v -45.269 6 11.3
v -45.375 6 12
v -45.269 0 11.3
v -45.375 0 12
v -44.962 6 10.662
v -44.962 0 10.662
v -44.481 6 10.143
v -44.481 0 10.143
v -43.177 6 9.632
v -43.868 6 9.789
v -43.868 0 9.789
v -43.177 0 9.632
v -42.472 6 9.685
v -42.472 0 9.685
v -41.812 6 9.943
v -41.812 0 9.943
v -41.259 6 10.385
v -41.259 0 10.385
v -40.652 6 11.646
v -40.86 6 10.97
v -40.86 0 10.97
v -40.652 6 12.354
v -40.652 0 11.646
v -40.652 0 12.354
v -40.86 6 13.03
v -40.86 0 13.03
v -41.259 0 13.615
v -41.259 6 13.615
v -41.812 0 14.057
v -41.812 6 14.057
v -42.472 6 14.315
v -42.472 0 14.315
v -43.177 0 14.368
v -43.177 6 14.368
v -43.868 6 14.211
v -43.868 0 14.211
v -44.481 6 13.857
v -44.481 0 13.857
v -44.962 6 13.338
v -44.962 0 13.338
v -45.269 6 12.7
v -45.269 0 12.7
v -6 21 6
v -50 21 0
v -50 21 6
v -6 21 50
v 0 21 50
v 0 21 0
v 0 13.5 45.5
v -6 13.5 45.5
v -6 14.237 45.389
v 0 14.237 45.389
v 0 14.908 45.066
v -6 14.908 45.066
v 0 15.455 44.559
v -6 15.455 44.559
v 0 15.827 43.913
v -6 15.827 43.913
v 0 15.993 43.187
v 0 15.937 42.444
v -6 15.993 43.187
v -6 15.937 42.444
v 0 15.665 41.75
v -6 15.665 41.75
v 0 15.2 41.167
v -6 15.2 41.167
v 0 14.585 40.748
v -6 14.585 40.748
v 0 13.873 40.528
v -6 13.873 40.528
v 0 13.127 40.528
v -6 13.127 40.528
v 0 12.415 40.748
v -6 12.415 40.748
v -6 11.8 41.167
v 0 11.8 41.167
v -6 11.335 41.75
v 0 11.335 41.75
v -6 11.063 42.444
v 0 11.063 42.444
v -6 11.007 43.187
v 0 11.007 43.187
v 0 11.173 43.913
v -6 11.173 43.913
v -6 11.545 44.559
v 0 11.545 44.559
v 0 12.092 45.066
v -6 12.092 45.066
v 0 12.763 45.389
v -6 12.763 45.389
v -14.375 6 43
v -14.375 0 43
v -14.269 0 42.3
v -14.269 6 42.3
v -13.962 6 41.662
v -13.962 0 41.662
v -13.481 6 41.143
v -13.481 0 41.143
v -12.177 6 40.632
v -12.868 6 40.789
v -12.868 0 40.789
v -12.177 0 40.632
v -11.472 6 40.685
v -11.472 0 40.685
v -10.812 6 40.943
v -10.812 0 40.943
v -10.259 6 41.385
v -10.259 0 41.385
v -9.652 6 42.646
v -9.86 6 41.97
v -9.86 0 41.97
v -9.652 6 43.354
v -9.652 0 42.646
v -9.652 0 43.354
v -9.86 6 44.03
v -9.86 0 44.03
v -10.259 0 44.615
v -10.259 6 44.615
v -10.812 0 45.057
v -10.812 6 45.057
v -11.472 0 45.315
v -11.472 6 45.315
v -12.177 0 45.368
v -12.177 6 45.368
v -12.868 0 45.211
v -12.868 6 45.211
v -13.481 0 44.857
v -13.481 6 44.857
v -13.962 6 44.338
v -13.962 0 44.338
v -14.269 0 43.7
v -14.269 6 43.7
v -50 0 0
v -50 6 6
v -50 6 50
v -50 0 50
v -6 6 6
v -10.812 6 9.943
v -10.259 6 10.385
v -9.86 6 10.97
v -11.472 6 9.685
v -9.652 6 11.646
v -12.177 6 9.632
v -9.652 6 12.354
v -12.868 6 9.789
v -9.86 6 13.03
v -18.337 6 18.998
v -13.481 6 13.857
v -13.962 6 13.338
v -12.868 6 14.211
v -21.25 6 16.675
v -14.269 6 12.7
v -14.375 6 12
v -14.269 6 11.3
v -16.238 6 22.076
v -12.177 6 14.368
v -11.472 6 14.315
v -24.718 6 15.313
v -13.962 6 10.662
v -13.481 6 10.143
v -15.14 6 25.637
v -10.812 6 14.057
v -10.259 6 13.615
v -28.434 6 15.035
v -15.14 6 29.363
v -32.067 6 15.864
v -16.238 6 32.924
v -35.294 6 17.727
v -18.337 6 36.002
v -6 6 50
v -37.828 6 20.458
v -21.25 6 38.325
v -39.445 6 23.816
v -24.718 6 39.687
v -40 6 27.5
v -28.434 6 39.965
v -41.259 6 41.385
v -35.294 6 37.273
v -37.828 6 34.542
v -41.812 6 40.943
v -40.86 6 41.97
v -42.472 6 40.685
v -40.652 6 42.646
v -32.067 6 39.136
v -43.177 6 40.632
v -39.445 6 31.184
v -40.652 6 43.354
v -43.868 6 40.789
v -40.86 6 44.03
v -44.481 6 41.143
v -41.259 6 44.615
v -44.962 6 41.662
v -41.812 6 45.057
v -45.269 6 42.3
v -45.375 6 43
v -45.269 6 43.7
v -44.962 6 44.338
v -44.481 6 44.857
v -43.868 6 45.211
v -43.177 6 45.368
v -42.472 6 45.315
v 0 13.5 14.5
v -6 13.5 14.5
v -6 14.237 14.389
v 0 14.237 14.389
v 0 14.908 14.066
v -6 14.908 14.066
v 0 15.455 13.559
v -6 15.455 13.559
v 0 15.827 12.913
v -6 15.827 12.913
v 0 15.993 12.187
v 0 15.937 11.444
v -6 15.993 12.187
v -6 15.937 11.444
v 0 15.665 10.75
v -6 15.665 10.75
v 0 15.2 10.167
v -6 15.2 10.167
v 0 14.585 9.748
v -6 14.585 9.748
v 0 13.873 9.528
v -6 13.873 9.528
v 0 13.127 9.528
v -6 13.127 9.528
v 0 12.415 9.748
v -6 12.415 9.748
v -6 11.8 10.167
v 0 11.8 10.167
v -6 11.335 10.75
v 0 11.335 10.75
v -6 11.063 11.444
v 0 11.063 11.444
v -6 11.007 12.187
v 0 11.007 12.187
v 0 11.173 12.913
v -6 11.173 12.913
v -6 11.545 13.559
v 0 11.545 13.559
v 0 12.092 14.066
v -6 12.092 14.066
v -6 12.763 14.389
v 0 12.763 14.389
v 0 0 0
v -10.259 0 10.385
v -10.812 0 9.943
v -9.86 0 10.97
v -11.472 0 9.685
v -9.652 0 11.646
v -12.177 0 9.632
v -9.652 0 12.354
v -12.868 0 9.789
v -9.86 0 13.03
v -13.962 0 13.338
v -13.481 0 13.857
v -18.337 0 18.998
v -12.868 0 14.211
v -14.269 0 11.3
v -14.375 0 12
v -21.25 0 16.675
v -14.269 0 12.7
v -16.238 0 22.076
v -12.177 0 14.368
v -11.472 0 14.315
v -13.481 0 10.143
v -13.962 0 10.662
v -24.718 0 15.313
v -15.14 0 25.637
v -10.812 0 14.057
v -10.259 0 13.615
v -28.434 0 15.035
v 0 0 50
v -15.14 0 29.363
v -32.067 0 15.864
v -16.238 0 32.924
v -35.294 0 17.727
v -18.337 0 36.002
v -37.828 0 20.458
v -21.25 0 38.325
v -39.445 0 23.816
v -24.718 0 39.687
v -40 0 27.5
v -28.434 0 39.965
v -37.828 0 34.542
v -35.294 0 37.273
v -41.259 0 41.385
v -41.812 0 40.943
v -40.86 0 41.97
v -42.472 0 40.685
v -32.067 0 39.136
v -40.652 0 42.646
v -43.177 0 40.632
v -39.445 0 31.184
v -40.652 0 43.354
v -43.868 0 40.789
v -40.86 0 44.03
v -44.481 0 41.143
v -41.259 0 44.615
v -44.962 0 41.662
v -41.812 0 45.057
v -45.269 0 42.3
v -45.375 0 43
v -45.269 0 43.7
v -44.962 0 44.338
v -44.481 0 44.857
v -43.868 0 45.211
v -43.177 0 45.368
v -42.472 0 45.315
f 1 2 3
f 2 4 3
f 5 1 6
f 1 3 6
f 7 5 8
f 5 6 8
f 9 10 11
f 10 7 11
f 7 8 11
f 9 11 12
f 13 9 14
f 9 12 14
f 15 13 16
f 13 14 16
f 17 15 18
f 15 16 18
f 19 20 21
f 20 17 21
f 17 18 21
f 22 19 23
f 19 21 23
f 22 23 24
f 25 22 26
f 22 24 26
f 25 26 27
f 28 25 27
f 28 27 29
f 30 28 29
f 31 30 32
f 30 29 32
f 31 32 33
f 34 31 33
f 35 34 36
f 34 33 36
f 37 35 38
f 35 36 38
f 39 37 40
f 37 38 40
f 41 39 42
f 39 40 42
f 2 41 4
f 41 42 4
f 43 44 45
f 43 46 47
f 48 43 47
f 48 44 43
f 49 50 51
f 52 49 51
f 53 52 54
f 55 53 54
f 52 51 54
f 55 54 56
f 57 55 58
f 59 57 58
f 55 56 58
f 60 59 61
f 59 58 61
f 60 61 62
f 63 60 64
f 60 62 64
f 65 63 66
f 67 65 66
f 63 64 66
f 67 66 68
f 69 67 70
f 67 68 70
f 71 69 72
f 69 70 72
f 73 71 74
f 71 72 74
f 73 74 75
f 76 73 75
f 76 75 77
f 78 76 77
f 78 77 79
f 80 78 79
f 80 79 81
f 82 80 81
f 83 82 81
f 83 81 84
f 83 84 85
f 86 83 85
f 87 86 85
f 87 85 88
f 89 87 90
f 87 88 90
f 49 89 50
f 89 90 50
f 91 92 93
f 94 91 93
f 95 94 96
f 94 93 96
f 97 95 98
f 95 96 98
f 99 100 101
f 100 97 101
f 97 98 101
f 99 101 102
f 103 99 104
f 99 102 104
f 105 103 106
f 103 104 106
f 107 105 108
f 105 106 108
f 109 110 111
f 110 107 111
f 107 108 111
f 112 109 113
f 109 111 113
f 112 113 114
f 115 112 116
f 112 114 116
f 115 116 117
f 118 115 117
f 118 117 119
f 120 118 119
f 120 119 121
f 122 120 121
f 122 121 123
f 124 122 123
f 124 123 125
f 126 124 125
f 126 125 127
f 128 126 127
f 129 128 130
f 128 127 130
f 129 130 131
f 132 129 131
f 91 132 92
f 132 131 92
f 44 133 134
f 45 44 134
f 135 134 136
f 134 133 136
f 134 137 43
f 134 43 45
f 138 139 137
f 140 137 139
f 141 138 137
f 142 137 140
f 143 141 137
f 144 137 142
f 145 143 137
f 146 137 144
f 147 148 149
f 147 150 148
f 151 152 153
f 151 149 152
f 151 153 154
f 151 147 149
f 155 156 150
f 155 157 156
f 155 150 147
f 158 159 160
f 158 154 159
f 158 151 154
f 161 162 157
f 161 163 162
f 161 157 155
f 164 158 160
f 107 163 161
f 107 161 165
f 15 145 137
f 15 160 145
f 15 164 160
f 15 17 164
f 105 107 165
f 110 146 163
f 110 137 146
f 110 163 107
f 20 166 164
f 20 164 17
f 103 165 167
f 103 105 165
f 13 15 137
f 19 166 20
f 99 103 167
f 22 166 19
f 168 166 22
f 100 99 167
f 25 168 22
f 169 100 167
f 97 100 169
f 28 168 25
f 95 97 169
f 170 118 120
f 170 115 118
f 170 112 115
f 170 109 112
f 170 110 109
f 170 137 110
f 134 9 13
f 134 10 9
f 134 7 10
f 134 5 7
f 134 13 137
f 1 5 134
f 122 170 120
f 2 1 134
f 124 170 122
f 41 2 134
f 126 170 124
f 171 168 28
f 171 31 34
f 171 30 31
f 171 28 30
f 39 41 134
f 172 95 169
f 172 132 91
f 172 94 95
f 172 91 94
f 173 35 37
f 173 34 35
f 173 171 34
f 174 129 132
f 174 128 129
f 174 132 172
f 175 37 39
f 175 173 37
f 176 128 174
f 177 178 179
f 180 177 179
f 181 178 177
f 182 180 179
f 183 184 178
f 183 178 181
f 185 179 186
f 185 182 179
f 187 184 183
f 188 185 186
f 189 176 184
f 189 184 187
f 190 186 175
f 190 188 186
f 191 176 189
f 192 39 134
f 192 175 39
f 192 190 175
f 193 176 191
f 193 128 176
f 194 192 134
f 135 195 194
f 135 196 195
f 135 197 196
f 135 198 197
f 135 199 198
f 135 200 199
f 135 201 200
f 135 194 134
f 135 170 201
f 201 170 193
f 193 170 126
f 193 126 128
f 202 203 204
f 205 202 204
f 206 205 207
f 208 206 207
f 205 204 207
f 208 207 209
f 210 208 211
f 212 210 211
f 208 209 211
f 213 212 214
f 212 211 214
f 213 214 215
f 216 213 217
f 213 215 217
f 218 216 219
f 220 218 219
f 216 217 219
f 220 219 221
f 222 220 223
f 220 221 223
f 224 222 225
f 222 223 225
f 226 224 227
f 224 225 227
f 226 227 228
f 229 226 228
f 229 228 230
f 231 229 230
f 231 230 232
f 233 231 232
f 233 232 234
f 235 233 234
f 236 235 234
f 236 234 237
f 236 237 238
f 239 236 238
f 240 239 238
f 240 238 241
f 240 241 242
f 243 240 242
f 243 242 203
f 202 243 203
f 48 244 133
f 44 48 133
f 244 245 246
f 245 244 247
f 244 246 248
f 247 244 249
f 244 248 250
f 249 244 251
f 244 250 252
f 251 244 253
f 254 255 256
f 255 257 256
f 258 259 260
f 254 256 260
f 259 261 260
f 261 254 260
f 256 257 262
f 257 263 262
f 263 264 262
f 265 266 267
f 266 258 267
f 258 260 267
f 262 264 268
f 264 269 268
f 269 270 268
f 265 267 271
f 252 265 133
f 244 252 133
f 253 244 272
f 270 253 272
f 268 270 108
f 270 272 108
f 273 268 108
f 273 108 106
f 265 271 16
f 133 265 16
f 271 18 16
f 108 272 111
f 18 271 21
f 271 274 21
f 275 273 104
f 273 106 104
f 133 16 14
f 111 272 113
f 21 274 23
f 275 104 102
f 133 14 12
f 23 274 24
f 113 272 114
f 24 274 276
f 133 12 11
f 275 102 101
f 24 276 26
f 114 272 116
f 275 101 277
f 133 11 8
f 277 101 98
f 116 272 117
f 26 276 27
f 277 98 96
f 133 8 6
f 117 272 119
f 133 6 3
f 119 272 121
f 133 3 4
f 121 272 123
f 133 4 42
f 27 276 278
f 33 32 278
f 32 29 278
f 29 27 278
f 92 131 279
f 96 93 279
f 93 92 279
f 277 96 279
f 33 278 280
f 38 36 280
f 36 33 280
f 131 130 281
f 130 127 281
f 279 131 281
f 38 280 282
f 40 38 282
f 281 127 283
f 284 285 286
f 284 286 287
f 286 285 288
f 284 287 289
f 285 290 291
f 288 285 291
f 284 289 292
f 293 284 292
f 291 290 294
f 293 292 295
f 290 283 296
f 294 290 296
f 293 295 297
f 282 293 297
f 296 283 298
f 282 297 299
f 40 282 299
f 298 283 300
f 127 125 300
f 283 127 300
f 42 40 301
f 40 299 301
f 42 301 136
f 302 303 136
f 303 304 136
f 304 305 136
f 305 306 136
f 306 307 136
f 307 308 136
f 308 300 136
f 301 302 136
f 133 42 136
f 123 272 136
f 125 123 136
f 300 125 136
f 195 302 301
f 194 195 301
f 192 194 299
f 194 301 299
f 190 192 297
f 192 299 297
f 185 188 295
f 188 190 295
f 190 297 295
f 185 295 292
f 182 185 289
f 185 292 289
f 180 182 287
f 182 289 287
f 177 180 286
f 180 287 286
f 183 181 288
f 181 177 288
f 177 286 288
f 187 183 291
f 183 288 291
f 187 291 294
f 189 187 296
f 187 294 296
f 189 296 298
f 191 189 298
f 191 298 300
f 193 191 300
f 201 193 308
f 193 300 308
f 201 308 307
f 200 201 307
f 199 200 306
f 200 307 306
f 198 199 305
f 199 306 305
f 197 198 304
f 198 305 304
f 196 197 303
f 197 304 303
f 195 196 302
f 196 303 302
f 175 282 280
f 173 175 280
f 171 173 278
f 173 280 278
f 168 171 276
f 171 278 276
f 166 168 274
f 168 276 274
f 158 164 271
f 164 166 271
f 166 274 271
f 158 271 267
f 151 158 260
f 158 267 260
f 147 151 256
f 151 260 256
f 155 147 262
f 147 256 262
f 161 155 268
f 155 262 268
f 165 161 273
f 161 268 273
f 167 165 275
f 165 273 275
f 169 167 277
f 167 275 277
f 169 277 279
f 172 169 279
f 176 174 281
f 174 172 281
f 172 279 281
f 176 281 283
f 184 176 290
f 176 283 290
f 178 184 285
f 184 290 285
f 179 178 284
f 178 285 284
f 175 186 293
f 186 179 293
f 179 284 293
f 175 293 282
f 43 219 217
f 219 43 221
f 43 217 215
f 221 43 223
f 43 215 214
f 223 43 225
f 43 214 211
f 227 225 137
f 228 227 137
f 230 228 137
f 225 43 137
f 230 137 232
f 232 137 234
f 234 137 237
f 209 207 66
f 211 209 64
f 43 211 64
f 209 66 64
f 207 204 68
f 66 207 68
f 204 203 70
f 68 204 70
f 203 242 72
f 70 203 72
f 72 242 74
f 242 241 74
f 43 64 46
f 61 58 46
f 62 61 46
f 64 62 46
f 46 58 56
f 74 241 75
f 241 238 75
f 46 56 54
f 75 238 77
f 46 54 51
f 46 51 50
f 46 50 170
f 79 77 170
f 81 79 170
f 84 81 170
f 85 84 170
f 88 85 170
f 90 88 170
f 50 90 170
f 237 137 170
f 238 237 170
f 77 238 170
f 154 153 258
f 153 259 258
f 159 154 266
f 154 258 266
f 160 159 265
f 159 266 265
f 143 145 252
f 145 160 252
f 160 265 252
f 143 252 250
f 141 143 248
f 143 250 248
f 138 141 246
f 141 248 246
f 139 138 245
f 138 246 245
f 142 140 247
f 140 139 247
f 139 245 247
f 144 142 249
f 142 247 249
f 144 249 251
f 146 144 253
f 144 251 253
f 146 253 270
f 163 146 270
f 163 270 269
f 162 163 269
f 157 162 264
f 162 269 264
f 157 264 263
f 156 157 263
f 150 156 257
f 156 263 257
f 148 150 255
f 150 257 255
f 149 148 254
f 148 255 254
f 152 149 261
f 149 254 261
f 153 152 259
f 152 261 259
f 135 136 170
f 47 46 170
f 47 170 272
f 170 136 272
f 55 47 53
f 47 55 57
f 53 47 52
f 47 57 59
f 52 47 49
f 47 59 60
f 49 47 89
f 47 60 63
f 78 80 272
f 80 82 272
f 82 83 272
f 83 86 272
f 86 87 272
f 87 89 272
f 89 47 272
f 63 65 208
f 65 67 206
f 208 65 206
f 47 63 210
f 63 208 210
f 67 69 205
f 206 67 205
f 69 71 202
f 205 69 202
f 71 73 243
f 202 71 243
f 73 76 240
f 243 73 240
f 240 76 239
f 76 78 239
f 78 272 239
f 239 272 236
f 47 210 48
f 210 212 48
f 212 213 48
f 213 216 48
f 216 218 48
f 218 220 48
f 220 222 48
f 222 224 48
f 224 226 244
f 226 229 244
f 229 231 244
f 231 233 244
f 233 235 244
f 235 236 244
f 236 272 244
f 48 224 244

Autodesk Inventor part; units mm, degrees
ref_plane "YZ Plane" through (0, 0, 0) normal (1, 0, 0) x (0, 1, 0)
ref_plane "XZ Plane" through (0, 0, 0) normal (0, 1, 0) x (-1, 0, 0)
ref_plane "XY Plane" through (0, 0, 0) normal (0, 0, 1) x (1, 0, 0)
sketch "Sketch1" plane through (0, 0, 0) normal (0, 1, 0) x (-1, 0, 0)
  line L0 (0, 0) -> (50, 0)
  line L1 (50, 0) -> (50, 50)
  line L2 (50, 50) -> (0, 50)
  line L3 (0, 50) -> (0, 0)
  circle A0 centre (12, 43) radius 2.375
  circle A1 centre (43, 43) radius 2.375
  circle A2 centre (43, 12) radius 2.375
  circle A3 centre (12, 12) radius 2.375
  circle A4 centre (27.5, 27.5) radius 12.5
  line L4 (43, 12) -> (27.5, 27.5) construction
  line L5 (27.5, 27.5) -> (12, 43) construction
  dimension "d0" = 50
  dimension "d1" = 50
  dimension "d2" = 4.75
  dimension "d3" = 31
  dimension "d4" = 31
  dimension "d5" = 7
  dimension "d6" = 7
  dimension "d7" = 25
extrude "Extrusion1" add sketch "Sketch1" along normal blind 6
sketch "Sketch2" plane through (0, 6, 0) normal (0, 1, 0) x (1, 0, 0)
  line L0 (0, 0) -> (-50, 0) projected
  line L1 (0, -50) -> (0, 0) projected
  line L2 (-50, 0) -> (0, 0)
  line L3 (0, -50) -> (-6, -50)
  line L4 (-6, -6) -> (-50, -6)
  line L5 (-6, -6) -> (-6, -50)
  line L6 (-50, -6) -> (-50, 0)
  line L7 (0, -50) -> (-6, -50)
  line L8 (0, 0) -> (0, -50)
  dimension "d10" = 6
extrude "Extrusion2" add sketch "Sketch2" along normal blind 15
sketch "Sketch3" plane through (-6, 6, 6) normal (-1, 0, 0) x (0, 0, 1)
  line L0 (0, 0) -> (0, 15) projected
  circle A0 centre (6, 7.5) radius 2.5
  circle A1 centre (37, 7.5) radius 2.5
  line L1 (0, 7.5) -> (6, 7.5) construction
  line L2 (6, 7.5) -> (37, 7.5) construction
  point P0 (-6, -6)
  dimension "d13" = 6
  dimension "d14" = 31
  dimension "d15" = 5
extrude "Extrusion3" cut sketch "Sketch3" against normal blind 15
equation "\"d1\" = d0"
equation "\"d4\" = d3"
equation "\"d6\" = d5"
properties part number "motorMount"
